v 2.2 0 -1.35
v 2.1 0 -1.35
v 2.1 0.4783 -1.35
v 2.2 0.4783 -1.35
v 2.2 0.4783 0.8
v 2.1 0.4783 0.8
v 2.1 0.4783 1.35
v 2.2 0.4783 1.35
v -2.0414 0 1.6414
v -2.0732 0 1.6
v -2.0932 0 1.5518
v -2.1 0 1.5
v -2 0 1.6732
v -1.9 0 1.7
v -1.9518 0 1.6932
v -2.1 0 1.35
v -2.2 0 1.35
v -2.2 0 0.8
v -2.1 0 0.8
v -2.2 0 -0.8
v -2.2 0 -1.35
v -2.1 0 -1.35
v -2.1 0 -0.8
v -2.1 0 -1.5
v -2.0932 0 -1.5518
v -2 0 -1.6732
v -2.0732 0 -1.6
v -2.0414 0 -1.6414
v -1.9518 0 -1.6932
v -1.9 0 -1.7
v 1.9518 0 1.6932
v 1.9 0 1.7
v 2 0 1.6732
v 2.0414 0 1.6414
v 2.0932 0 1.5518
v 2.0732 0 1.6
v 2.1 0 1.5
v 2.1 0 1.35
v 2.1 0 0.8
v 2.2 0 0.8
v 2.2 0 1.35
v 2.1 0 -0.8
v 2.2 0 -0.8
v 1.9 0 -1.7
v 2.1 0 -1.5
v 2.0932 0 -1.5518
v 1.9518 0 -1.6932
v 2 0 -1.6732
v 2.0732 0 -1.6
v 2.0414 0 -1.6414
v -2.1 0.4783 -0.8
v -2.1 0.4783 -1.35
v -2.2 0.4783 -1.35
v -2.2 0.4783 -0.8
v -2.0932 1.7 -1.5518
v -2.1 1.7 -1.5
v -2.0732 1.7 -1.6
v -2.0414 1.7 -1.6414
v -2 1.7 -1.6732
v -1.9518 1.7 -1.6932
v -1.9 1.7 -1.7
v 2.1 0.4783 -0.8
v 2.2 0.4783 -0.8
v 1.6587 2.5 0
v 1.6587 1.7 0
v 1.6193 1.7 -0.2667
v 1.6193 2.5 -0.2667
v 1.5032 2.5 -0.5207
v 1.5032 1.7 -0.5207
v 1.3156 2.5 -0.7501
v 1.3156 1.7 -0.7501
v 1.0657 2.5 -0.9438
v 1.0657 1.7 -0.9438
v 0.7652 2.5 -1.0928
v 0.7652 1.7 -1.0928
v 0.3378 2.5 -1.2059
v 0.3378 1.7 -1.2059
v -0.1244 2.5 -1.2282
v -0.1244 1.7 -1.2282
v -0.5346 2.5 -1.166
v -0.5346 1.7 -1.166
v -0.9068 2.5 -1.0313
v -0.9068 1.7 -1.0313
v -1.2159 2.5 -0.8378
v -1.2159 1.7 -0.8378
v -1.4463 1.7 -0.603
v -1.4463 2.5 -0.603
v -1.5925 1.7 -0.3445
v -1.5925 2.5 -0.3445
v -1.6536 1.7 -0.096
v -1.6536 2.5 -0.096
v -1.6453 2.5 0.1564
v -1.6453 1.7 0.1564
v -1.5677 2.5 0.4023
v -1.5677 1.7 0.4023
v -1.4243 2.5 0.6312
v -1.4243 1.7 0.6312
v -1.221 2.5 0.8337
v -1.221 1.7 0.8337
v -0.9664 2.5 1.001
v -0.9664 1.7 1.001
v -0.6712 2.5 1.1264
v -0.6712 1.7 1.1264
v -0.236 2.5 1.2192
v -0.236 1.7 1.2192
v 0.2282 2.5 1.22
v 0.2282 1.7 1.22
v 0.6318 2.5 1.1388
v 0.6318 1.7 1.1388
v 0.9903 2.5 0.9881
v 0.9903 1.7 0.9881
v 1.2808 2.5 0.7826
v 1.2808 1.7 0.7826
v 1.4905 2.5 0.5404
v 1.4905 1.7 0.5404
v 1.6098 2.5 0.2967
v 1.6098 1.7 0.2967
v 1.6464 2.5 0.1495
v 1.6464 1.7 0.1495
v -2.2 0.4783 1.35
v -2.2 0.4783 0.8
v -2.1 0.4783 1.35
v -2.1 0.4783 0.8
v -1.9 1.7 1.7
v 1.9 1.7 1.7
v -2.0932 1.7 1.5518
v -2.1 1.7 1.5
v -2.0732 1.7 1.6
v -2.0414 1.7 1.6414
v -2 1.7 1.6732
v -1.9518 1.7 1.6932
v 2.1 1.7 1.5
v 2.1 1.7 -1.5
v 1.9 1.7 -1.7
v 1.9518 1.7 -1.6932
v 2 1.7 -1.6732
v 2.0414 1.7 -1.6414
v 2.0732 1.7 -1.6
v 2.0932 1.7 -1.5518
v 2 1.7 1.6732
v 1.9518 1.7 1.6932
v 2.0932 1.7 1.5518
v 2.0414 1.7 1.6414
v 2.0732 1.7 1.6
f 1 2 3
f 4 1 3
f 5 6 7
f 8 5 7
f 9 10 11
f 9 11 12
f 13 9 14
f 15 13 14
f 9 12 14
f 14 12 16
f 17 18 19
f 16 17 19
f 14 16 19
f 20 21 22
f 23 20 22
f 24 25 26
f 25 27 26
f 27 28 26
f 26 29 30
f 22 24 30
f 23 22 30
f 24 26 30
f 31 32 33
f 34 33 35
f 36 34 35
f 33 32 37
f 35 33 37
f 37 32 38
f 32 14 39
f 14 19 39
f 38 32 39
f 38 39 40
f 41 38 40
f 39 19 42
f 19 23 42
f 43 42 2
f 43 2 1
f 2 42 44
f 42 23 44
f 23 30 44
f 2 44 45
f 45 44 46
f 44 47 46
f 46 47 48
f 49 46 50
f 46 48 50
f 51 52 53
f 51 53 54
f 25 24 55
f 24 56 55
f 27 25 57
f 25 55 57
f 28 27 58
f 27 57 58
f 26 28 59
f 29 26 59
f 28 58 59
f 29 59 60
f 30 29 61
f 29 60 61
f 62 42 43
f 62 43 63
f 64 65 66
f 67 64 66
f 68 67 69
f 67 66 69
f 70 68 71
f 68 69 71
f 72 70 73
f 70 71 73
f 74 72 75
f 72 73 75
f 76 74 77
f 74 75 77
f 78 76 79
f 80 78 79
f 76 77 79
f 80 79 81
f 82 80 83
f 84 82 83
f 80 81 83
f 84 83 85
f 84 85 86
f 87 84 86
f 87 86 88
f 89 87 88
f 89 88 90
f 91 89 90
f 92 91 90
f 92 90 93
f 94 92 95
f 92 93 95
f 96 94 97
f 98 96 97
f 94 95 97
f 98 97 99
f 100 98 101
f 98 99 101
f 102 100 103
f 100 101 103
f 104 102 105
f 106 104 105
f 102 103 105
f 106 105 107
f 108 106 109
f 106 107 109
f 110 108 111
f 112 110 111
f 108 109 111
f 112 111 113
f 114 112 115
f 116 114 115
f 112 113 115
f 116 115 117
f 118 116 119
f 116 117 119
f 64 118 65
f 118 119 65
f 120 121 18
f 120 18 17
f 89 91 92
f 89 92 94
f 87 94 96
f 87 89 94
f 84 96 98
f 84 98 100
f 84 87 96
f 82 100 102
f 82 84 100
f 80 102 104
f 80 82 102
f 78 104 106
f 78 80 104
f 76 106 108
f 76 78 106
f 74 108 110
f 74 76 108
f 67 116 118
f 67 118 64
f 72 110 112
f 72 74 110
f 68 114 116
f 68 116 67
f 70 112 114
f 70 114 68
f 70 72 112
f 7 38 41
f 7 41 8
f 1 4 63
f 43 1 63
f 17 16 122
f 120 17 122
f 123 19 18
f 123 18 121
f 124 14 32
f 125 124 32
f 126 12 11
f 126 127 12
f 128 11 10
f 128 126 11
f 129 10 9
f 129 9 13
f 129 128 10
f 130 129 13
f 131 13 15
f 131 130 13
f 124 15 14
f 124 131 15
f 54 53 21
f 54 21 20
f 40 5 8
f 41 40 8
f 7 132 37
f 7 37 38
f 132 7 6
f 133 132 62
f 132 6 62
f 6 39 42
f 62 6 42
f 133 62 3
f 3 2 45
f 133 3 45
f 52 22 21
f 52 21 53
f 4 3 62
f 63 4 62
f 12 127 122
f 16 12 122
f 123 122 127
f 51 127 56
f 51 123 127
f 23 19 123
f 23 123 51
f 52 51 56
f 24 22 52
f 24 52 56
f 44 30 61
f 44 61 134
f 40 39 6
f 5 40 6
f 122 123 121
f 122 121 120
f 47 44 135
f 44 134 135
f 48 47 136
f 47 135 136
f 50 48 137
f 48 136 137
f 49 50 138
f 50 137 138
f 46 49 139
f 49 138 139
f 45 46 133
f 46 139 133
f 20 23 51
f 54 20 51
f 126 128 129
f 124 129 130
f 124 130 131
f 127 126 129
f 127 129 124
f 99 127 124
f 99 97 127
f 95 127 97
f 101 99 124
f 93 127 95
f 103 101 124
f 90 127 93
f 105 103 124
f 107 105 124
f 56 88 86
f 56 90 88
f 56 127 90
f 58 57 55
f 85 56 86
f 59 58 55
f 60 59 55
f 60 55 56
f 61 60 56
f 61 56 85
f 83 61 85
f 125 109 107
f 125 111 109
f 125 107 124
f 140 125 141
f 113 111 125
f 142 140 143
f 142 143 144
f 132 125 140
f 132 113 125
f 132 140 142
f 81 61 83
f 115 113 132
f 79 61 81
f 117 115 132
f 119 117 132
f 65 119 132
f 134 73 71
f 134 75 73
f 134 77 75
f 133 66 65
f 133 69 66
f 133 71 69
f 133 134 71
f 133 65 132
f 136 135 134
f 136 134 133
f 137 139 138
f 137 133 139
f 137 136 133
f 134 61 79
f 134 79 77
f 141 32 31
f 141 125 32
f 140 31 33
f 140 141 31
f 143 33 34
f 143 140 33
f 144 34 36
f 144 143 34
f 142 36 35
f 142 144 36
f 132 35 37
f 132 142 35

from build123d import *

# Parameters (mm, degrees)
SKETCH_1_W      = 4.2
SKETCH_1_H      = 3.4
EXTRUDE_1_DEPTH = 1.7
SKETCH_2_RX     = 1.658686792
SKETCH_2_RY     = 1.231698113
EXTRUDE_2_DEPTH = 0.8
FILLET_1_R      = 0.2
SKETCH_3_W      = 0.55
SKETCH_3_H      = 0.478335134
EXTRUDE_3_DEPTH = 0.1


with BuildPart() as part:
    # 草图1 → 凸台-拉伸1 (new body)
    with BuildSketch(Plane(origin=(0, 0, 0), x_dir=(1, 0, 0), z_dir=(0, 1, 0))):
        Rectangle(SKETCH_1_W, SKETCH_1_H)
    extrude(amount=EXTRUDE_1_DEPTH)

    # 草图2 → 凸台-拉伸2 (add)
    with BuildSketch(Plane(origin=(0, 1.7, 0), x_dir=(1, 0, 0), z_dir=(0, 1, 0))):
        with Locations((0, 0)):
            Ellipse(SKETCH_2_RX, SKETCH_2_RY)
    extrude(amount=EXTRUDE_2_DEPTH)

    # 圆角1
    fillet_1_edges = [part.edges().sort_by_distance(p)[0] for p in [
        (2.1, 0.85, 1.7),
        (-2.1, 0.85, 1.7),
        (-2.1, 0.85, -1.7),
        (2.1, 0.85, -1.7),
    ]]
    fillet(fillet_1_edges, radius=FILLET_1_R)

    # 草图3 → 凸台-拉伸3 (add)
    with BuildSketch(Plane.ZY.offset(2.1)):
        with Locations((-1.075, 0.239167567)):
            Rectangle(SKETCH_3_W, SKETCH_3_H)
        with Locations((1.075, 0.239167567)):
            Rectangle(SKETCH_3_W, SKETCH_3_H)
    extrude_3 = extrude(amount=EXTRUDE_3_DEPTH)

    # 镜向1: 凸台-拉伸3 across plane
    add(extrude_3.mirror(Plane(origin=(0, 0, 0), x_dir=(0, 0, 1), z_dir=(1, 0, 0))))


solid = part.part
